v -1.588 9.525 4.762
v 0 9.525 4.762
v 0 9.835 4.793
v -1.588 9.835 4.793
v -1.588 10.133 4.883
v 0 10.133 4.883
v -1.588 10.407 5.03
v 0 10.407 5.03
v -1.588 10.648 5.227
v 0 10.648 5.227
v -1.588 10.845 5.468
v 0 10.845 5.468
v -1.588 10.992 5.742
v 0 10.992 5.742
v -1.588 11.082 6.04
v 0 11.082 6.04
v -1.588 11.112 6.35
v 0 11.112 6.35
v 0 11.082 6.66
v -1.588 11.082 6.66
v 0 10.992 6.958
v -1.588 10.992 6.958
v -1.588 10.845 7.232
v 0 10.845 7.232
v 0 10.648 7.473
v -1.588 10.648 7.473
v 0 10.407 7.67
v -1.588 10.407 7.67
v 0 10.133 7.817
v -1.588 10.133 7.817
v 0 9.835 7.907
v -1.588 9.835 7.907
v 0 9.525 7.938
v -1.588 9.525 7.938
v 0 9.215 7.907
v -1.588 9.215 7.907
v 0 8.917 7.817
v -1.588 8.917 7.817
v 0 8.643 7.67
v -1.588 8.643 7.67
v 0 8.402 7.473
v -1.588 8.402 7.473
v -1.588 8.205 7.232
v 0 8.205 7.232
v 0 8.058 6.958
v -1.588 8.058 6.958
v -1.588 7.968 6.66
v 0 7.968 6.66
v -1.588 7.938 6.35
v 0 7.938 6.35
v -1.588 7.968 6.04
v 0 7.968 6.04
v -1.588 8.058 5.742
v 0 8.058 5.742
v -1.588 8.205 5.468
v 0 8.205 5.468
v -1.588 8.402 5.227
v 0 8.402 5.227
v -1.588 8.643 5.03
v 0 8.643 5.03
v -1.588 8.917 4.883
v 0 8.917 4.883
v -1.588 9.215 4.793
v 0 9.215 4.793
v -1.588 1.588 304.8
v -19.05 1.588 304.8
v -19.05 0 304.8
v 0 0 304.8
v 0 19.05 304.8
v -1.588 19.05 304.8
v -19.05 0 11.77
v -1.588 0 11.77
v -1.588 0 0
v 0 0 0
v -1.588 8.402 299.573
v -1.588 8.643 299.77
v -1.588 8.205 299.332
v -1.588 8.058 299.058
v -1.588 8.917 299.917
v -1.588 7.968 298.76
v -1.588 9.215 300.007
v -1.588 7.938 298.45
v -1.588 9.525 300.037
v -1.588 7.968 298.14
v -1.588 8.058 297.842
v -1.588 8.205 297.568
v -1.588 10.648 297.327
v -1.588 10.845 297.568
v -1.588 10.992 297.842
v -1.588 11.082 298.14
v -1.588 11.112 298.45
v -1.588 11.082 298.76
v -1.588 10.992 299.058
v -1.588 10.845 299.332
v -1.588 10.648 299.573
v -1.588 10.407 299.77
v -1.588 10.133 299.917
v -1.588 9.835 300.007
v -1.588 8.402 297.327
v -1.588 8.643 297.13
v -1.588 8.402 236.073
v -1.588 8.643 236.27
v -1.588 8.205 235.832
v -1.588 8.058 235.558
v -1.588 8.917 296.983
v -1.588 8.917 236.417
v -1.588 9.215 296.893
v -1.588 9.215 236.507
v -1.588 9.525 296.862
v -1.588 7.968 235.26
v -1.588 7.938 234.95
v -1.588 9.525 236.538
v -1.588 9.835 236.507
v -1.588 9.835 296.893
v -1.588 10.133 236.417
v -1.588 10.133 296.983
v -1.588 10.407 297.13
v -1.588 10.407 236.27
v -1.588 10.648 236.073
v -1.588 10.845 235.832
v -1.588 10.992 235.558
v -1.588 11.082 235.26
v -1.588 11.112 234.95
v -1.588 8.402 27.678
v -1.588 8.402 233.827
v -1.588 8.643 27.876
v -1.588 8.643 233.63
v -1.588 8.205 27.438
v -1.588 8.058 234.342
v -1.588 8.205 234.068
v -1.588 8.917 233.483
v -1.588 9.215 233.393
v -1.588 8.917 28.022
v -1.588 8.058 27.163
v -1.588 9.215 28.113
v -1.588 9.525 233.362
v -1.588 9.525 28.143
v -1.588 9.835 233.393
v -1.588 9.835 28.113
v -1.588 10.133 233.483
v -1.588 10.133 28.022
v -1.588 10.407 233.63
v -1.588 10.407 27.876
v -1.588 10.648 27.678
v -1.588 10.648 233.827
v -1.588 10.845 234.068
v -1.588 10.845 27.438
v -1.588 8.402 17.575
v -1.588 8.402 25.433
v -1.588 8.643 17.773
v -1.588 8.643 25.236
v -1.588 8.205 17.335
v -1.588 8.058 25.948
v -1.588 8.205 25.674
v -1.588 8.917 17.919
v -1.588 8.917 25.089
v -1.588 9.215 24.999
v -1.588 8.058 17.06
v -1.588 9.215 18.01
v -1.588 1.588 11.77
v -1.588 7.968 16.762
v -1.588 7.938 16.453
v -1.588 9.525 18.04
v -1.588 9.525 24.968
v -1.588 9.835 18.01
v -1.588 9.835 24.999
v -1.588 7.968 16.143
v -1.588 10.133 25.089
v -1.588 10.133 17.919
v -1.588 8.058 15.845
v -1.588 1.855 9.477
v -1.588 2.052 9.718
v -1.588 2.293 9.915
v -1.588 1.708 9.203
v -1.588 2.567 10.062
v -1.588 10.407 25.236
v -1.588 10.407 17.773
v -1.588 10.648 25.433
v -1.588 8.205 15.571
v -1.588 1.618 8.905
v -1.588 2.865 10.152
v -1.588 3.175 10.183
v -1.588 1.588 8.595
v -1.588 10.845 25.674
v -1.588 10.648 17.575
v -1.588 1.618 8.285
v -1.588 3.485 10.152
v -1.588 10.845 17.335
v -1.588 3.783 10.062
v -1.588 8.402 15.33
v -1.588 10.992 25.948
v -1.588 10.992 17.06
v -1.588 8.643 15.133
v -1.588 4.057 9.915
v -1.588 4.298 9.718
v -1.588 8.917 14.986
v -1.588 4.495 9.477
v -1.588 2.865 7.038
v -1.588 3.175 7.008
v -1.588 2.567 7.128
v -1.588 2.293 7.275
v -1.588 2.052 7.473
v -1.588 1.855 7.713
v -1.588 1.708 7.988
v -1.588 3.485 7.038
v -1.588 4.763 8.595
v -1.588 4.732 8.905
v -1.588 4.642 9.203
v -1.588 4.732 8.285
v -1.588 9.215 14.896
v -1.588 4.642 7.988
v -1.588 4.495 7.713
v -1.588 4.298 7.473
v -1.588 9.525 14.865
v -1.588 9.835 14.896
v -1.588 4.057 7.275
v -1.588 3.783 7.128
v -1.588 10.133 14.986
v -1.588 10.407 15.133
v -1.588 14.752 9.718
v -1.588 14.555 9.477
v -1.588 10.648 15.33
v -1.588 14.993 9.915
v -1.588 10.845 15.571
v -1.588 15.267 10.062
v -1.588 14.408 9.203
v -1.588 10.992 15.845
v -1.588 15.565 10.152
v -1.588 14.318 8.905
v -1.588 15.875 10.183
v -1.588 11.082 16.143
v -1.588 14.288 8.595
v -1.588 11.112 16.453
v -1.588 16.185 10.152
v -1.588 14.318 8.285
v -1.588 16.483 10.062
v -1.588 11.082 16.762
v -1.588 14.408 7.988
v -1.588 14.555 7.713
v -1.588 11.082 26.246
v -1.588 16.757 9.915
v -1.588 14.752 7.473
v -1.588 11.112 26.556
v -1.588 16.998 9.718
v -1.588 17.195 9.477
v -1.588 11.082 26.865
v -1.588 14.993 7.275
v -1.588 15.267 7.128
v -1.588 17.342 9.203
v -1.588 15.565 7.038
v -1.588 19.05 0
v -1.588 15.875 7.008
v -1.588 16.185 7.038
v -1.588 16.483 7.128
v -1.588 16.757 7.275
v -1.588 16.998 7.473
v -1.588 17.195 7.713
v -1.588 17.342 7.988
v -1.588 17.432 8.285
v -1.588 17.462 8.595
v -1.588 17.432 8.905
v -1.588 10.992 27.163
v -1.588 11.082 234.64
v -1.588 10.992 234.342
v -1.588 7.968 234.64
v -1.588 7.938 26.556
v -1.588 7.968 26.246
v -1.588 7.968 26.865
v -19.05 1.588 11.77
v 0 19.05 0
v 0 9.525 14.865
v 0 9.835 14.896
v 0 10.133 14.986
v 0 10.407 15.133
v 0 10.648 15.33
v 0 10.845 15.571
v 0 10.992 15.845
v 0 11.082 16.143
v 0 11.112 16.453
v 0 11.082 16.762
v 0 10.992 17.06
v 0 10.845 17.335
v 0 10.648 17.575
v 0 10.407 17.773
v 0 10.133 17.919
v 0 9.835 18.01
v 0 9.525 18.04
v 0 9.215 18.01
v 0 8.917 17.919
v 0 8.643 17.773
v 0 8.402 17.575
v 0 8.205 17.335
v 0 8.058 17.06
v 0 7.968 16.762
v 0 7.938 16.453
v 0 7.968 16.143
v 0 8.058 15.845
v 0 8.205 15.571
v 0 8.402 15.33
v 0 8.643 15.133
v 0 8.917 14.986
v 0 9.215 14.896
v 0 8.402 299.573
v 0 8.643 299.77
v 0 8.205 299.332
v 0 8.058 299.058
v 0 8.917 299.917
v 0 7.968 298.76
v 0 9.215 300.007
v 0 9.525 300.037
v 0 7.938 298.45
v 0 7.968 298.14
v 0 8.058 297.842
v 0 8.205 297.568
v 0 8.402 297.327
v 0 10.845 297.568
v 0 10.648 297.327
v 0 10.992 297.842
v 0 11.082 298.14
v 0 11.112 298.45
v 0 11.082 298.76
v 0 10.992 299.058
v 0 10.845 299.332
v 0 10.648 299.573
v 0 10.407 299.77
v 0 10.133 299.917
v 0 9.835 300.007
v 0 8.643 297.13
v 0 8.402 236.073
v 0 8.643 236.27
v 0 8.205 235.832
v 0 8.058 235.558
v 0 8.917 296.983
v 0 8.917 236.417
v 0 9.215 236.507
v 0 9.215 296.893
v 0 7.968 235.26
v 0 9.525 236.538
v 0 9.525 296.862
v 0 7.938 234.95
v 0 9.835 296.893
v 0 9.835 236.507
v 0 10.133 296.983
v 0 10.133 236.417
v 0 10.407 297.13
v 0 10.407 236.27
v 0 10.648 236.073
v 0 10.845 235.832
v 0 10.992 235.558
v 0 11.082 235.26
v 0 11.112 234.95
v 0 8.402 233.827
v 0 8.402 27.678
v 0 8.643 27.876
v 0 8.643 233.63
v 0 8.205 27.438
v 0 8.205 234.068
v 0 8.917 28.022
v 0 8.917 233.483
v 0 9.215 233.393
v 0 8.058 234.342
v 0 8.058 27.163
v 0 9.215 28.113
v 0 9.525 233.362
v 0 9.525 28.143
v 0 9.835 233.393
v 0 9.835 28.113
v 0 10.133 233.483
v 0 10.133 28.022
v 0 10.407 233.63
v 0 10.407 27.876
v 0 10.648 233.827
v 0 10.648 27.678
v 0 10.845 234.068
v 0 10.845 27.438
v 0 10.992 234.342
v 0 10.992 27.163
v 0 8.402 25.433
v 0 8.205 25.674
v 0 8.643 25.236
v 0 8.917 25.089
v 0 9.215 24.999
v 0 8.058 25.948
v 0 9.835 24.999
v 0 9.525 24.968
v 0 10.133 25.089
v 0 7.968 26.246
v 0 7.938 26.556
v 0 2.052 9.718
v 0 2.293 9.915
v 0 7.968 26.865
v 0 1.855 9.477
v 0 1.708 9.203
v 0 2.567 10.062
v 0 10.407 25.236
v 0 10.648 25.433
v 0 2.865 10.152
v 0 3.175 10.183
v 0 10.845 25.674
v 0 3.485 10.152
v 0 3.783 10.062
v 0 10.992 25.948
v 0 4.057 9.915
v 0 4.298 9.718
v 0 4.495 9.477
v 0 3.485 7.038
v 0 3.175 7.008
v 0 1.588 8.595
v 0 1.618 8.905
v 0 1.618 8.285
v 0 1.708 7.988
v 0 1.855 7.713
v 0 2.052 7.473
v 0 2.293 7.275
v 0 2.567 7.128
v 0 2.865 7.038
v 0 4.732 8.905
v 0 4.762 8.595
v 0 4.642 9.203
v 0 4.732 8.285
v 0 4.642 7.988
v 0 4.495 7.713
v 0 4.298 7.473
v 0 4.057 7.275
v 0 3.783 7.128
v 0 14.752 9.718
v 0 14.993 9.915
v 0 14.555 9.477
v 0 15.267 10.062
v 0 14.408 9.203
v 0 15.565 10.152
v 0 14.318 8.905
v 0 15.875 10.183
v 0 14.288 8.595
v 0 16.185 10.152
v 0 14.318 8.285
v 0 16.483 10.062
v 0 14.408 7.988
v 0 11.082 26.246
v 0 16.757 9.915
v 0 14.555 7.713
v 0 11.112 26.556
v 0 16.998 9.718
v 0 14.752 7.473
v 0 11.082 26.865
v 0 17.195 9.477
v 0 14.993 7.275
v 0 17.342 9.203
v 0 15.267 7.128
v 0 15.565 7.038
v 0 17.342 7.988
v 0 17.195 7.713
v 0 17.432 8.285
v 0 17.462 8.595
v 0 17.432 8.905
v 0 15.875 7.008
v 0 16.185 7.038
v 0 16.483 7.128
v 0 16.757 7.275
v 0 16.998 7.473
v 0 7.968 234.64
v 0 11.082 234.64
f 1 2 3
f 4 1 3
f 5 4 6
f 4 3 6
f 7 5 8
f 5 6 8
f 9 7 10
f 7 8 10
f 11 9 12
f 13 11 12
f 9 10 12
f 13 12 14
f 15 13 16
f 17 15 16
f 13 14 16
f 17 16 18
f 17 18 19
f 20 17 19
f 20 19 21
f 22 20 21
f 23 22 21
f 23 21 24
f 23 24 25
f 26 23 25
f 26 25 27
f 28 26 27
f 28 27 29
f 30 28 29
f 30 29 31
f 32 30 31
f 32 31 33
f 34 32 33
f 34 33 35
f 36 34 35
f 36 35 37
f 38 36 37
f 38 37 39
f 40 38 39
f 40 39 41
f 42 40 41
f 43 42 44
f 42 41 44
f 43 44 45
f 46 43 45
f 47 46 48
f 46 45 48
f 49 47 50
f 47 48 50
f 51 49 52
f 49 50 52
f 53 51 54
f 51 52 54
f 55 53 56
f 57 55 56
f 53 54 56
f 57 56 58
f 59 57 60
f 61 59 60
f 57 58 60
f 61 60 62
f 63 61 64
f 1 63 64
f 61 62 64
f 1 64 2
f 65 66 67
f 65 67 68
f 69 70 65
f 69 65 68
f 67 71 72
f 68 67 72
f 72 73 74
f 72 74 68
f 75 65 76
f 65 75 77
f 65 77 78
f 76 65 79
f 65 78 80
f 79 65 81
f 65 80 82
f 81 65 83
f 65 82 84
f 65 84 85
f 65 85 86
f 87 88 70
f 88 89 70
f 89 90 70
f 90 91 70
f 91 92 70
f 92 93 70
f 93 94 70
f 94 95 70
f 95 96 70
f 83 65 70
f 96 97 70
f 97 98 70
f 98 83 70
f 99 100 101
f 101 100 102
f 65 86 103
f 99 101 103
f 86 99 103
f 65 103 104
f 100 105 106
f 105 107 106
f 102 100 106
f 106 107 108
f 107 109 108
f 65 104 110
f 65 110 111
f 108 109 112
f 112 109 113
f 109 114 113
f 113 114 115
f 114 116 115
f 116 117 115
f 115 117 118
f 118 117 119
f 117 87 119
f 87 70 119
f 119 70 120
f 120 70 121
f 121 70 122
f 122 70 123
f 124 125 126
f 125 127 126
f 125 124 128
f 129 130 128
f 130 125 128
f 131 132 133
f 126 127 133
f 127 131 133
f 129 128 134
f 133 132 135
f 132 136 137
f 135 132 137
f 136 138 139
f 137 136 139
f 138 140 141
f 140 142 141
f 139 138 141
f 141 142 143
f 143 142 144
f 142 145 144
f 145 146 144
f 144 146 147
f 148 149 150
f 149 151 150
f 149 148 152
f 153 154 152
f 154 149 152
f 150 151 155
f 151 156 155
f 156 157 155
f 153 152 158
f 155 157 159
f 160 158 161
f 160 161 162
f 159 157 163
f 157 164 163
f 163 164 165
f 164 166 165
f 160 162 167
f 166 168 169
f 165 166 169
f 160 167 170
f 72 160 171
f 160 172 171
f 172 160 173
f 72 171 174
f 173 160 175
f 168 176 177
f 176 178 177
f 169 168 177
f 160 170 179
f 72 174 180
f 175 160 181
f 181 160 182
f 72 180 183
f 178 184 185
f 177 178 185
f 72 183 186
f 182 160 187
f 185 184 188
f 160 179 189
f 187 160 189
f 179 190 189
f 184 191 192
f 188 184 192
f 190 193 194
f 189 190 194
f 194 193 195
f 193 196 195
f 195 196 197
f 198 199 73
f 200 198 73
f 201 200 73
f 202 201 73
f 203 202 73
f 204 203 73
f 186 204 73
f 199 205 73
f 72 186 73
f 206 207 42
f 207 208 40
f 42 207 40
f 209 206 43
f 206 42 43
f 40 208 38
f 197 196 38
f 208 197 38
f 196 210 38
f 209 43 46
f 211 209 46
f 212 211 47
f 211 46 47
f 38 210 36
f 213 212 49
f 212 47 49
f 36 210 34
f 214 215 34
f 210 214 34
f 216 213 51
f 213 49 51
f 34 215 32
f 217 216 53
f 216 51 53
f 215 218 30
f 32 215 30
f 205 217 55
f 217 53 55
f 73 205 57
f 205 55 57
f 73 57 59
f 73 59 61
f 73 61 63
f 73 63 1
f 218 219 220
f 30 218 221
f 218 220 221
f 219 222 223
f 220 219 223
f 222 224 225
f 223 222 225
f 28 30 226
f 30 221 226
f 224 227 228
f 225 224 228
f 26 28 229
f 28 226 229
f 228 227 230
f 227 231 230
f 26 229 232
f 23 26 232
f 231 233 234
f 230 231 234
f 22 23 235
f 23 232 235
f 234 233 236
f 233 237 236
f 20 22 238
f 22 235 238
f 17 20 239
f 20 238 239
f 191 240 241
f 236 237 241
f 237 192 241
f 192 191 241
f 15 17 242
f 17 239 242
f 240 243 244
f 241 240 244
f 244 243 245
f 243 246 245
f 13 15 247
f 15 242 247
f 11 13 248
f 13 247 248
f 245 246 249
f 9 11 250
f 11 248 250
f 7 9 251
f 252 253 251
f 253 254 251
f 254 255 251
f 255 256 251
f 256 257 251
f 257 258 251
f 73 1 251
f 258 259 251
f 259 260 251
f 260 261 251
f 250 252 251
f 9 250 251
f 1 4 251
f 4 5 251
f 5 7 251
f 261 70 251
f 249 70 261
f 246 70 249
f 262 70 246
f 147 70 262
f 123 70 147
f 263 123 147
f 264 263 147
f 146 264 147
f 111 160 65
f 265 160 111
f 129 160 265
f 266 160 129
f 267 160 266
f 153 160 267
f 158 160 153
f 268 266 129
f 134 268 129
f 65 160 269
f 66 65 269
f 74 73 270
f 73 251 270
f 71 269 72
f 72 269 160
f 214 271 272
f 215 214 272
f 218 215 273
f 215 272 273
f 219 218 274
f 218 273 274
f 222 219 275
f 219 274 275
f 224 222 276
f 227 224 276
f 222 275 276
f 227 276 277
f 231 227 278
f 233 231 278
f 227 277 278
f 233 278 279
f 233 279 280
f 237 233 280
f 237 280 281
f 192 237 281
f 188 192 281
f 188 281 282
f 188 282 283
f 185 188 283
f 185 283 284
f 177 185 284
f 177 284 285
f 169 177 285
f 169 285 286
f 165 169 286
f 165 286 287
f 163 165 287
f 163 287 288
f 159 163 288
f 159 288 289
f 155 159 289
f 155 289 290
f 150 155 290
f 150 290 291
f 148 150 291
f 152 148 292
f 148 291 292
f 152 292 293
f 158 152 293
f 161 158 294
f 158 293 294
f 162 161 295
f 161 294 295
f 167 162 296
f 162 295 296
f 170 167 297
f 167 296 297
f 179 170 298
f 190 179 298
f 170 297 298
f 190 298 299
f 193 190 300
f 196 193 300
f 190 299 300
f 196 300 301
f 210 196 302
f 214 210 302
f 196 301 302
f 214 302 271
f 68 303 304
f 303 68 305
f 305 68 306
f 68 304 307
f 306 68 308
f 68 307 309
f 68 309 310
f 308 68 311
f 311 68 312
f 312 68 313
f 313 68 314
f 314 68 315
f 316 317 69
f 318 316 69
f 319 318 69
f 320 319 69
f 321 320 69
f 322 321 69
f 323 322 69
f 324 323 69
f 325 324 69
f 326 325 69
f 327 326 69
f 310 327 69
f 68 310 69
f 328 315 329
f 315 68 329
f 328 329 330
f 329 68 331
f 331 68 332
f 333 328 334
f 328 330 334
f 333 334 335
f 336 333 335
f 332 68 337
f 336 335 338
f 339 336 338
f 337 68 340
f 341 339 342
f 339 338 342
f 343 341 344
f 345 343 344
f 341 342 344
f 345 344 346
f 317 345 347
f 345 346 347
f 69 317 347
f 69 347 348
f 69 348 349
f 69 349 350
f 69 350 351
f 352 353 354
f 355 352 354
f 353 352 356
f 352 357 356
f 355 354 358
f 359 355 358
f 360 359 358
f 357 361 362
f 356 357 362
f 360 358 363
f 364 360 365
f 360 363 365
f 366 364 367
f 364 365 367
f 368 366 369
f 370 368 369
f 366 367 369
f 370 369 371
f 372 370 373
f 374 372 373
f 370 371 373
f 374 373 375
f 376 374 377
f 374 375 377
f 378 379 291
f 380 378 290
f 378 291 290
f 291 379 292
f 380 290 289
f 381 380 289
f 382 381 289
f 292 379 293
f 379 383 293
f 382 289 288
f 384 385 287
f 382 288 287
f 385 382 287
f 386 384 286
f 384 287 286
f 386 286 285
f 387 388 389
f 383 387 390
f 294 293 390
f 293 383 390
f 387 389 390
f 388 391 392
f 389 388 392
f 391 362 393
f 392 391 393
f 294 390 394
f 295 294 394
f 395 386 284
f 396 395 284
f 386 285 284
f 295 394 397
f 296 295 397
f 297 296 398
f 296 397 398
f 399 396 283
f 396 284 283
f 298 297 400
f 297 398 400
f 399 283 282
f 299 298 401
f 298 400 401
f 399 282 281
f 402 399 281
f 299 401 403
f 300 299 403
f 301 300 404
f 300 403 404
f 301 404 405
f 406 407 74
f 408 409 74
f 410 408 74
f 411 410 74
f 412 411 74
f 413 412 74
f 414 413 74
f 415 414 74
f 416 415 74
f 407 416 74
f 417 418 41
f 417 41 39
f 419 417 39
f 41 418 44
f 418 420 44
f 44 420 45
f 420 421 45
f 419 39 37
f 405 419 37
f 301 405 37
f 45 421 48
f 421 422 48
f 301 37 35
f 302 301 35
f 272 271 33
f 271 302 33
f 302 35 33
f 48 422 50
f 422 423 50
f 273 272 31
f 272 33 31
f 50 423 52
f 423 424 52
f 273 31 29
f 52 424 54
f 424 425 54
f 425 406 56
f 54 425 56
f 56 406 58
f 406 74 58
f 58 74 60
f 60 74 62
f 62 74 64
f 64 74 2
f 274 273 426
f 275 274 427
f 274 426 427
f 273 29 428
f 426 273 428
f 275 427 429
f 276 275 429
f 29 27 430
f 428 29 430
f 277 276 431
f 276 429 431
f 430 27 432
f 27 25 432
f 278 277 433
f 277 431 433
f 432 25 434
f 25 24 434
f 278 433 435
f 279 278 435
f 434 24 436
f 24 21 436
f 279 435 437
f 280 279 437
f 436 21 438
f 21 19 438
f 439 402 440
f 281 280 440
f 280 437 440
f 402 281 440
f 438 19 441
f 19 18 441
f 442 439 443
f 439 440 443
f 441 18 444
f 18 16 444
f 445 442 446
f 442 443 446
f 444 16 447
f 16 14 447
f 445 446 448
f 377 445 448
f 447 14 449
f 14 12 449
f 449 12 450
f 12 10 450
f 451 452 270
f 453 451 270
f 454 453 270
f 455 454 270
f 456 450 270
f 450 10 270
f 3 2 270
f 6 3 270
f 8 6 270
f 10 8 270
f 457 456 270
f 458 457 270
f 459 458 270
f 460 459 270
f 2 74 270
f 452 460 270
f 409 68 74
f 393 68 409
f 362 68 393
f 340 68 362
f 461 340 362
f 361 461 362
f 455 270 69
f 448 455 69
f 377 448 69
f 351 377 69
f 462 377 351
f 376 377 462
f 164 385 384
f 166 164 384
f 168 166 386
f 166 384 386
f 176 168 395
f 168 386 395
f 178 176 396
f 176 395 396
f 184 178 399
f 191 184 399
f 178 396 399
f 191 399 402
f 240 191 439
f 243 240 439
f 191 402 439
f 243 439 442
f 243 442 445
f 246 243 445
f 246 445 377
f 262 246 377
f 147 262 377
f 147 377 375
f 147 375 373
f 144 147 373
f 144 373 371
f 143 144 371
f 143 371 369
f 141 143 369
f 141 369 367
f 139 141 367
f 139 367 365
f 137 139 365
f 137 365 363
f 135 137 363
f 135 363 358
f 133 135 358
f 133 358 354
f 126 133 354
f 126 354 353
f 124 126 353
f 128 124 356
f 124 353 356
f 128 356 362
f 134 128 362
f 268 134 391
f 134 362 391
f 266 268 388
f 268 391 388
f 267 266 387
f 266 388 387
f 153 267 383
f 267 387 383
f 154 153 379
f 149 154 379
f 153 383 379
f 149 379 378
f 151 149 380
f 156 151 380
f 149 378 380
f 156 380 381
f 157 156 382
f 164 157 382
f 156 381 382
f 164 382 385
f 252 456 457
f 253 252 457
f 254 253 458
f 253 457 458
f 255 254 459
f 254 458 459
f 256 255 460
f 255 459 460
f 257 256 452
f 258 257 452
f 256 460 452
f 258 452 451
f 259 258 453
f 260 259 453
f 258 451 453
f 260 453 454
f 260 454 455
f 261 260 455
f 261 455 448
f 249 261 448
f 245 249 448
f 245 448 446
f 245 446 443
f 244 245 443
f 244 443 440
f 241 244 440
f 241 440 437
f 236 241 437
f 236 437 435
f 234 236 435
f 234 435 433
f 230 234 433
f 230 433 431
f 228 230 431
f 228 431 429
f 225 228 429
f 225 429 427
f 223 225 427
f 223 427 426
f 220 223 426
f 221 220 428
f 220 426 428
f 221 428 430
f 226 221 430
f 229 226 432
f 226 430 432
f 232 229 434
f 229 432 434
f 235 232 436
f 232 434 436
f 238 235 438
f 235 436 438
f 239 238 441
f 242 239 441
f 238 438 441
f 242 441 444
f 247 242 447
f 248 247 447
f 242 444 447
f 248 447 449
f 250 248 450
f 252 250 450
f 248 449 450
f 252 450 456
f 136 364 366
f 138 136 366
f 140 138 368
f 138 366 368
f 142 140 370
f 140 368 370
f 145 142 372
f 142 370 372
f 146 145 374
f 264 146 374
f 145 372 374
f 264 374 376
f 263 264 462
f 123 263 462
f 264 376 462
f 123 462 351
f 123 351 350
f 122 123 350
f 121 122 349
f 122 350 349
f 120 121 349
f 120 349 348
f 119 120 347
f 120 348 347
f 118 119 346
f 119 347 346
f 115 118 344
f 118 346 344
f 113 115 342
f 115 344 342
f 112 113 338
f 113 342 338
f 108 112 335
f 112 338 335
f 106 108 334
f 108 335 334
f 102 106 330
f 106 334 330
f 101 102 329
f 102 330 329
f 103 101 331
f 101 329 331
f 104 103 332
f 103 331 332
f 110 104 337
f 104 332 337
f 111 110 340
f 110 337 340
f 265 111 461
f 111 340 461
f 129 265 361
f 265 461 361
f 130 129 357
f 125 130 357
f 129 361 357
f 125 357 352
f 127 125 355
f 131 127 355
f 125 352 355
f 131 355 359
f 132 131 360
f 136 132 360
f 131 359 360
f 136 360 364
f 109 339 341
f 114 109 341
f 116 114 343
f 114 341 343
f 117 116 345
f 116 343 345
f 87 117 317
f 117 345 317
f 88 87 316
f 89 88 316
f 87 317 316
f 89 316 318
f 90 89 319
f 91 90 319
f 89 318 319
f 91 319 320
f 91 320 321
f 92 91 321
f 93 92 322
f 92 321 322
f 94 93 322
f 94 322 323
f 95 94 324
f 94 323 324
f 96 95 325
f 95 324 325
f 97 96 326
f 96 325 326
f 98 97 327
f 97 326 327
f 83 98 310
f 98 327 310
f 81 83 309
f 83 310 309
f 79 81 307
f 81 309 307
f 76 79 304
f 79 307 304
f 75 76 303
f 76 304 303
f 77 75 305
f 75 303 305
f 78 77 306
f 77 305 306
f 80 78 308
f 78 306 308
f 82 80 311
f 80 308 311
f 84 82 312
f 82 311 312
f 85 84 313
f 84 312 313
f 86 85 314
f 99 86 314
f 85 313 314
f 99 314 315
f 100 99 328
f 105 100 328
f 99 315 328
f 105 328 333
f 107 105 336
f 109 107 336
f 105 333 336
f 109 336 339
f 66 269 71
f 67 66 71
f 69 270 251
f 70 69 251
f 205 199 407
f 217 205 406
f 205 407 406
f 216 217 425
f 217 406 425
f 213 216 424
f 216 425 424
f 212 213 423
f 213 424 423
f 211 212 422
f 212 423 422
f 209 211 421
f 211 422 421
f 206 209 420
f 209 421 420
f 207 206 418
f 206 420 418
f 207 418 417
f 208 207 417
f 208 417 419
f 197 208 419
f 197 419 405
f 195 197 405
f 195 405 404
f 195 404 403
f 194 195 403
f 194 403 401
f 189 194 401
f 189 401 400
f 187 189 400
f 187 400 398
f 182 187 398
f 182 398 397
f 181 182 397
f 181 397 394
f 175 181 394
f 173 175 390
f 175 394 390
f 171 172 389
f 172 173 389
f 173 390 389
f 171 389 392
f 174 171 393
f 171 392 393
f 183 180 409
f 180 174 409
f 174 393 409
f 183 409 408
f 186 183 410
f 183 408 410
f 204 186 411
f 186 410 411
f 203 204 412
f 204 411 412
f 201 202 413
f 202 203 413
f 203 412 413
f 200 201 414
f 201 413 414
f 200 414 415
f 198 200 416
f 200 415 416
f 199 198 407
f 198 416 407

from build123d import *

# Parameters (mm, degrees)
EXTRUDE1_DEPTH     = 304.8
SKETCH2_R          = 1.5875
EXTRUDE2_DEPTH     = 1.5875
SKETCH3_R          = 1.5875
CUT_EXTRUDE3_DEPTH = 306.9883086
SKETCH6_R          = 1.5875
CUT_EXTRUDE5_DEPTH = 306.9883086
SKETCH7_W          = 17.4625
SKETCH7_H          = 11.77006403
CUT_EXTRUDE6_DEPTH = 306.893578563


with BuildPart() as part:
    # Sketch1 → Extrude1 (new body)
    with BuildSketch(Plane.XY):
        Polygon((0, 0), (0, 19.05), (-1.5875, 19.05), (-1.5875, 1.5875), (-19.05, 1.5875), (-19.05, 0), align=None)
    extrude(amount=EXTRUDE1_DEPTH)

    # Sketch2 → Extrude2 (cut)
    with BuildSketch(Plane(origin=(0, 0, 0), x_dir=(0, 0, -1), z_dir=(1, 0, 0))):
        with Locations((-298.45, 9.525)):
            Circle(SKETCH2_R)
        with Locations((-234.95, 9.525)):
            Circle(SKETCH2_R)
    extrude(amount=-EXTRUDE2_DEPTH, mode=Mode.SUBTRACT)

    # Sketch3 → Cut-Extrude3 (cut, through all)
    with BuildSketch(Plane(origin=(0, 0, 0), x_dir=(0, 0, -1), z_dir=(1, 0, 0))):
        with Locations((-26.555576272, 9.525)):
            Circle(SKETCH3_R)
        with Locations((-16.452788136, 9.525)):
            Circle(SKETCH3_R)
    extrude(amount=-CUT_EXTRUDE3_DEPTH, mode=Mode.SUBTRACT)

    # Sketch6 → Cut-Extrude5 (cut, through all)
    with BuildSketch(Plane(origin=(0, 0, 0), x_dir=(0, 0, -1), z_dir=(1, 0, 0))):
        with Locations((-8.59506403, 15.875)):
            Circle(SKETCH6_R)
        with Locations((-8.59506403, 3.175)):
            Circle(SKETCH6_R)
        with Locations((-6.35, 9.525)):
            Circle(SKETCH6_R)
    extrude(amount=-CUT_EXTRUDE5_DEPTH, mode=Mode.SUBTRACT)

    # Sketch7 → Cut-Extrude6 (cut, through all)
    with BuildSketch(Plane(origin=(0, 1.5875, 0), x_dir=(1, 0, 0), z_dir=(0, 1, 0))):
        with Locations((-10.31875, -5.885032015)):
            Rectangle(SKETCH7_W, SKETCH7_H)
    extrude(amount=-CUT_EXTRUDE6_DEPTH, mode=Mode.SUBTRACT)


solid = part.part
